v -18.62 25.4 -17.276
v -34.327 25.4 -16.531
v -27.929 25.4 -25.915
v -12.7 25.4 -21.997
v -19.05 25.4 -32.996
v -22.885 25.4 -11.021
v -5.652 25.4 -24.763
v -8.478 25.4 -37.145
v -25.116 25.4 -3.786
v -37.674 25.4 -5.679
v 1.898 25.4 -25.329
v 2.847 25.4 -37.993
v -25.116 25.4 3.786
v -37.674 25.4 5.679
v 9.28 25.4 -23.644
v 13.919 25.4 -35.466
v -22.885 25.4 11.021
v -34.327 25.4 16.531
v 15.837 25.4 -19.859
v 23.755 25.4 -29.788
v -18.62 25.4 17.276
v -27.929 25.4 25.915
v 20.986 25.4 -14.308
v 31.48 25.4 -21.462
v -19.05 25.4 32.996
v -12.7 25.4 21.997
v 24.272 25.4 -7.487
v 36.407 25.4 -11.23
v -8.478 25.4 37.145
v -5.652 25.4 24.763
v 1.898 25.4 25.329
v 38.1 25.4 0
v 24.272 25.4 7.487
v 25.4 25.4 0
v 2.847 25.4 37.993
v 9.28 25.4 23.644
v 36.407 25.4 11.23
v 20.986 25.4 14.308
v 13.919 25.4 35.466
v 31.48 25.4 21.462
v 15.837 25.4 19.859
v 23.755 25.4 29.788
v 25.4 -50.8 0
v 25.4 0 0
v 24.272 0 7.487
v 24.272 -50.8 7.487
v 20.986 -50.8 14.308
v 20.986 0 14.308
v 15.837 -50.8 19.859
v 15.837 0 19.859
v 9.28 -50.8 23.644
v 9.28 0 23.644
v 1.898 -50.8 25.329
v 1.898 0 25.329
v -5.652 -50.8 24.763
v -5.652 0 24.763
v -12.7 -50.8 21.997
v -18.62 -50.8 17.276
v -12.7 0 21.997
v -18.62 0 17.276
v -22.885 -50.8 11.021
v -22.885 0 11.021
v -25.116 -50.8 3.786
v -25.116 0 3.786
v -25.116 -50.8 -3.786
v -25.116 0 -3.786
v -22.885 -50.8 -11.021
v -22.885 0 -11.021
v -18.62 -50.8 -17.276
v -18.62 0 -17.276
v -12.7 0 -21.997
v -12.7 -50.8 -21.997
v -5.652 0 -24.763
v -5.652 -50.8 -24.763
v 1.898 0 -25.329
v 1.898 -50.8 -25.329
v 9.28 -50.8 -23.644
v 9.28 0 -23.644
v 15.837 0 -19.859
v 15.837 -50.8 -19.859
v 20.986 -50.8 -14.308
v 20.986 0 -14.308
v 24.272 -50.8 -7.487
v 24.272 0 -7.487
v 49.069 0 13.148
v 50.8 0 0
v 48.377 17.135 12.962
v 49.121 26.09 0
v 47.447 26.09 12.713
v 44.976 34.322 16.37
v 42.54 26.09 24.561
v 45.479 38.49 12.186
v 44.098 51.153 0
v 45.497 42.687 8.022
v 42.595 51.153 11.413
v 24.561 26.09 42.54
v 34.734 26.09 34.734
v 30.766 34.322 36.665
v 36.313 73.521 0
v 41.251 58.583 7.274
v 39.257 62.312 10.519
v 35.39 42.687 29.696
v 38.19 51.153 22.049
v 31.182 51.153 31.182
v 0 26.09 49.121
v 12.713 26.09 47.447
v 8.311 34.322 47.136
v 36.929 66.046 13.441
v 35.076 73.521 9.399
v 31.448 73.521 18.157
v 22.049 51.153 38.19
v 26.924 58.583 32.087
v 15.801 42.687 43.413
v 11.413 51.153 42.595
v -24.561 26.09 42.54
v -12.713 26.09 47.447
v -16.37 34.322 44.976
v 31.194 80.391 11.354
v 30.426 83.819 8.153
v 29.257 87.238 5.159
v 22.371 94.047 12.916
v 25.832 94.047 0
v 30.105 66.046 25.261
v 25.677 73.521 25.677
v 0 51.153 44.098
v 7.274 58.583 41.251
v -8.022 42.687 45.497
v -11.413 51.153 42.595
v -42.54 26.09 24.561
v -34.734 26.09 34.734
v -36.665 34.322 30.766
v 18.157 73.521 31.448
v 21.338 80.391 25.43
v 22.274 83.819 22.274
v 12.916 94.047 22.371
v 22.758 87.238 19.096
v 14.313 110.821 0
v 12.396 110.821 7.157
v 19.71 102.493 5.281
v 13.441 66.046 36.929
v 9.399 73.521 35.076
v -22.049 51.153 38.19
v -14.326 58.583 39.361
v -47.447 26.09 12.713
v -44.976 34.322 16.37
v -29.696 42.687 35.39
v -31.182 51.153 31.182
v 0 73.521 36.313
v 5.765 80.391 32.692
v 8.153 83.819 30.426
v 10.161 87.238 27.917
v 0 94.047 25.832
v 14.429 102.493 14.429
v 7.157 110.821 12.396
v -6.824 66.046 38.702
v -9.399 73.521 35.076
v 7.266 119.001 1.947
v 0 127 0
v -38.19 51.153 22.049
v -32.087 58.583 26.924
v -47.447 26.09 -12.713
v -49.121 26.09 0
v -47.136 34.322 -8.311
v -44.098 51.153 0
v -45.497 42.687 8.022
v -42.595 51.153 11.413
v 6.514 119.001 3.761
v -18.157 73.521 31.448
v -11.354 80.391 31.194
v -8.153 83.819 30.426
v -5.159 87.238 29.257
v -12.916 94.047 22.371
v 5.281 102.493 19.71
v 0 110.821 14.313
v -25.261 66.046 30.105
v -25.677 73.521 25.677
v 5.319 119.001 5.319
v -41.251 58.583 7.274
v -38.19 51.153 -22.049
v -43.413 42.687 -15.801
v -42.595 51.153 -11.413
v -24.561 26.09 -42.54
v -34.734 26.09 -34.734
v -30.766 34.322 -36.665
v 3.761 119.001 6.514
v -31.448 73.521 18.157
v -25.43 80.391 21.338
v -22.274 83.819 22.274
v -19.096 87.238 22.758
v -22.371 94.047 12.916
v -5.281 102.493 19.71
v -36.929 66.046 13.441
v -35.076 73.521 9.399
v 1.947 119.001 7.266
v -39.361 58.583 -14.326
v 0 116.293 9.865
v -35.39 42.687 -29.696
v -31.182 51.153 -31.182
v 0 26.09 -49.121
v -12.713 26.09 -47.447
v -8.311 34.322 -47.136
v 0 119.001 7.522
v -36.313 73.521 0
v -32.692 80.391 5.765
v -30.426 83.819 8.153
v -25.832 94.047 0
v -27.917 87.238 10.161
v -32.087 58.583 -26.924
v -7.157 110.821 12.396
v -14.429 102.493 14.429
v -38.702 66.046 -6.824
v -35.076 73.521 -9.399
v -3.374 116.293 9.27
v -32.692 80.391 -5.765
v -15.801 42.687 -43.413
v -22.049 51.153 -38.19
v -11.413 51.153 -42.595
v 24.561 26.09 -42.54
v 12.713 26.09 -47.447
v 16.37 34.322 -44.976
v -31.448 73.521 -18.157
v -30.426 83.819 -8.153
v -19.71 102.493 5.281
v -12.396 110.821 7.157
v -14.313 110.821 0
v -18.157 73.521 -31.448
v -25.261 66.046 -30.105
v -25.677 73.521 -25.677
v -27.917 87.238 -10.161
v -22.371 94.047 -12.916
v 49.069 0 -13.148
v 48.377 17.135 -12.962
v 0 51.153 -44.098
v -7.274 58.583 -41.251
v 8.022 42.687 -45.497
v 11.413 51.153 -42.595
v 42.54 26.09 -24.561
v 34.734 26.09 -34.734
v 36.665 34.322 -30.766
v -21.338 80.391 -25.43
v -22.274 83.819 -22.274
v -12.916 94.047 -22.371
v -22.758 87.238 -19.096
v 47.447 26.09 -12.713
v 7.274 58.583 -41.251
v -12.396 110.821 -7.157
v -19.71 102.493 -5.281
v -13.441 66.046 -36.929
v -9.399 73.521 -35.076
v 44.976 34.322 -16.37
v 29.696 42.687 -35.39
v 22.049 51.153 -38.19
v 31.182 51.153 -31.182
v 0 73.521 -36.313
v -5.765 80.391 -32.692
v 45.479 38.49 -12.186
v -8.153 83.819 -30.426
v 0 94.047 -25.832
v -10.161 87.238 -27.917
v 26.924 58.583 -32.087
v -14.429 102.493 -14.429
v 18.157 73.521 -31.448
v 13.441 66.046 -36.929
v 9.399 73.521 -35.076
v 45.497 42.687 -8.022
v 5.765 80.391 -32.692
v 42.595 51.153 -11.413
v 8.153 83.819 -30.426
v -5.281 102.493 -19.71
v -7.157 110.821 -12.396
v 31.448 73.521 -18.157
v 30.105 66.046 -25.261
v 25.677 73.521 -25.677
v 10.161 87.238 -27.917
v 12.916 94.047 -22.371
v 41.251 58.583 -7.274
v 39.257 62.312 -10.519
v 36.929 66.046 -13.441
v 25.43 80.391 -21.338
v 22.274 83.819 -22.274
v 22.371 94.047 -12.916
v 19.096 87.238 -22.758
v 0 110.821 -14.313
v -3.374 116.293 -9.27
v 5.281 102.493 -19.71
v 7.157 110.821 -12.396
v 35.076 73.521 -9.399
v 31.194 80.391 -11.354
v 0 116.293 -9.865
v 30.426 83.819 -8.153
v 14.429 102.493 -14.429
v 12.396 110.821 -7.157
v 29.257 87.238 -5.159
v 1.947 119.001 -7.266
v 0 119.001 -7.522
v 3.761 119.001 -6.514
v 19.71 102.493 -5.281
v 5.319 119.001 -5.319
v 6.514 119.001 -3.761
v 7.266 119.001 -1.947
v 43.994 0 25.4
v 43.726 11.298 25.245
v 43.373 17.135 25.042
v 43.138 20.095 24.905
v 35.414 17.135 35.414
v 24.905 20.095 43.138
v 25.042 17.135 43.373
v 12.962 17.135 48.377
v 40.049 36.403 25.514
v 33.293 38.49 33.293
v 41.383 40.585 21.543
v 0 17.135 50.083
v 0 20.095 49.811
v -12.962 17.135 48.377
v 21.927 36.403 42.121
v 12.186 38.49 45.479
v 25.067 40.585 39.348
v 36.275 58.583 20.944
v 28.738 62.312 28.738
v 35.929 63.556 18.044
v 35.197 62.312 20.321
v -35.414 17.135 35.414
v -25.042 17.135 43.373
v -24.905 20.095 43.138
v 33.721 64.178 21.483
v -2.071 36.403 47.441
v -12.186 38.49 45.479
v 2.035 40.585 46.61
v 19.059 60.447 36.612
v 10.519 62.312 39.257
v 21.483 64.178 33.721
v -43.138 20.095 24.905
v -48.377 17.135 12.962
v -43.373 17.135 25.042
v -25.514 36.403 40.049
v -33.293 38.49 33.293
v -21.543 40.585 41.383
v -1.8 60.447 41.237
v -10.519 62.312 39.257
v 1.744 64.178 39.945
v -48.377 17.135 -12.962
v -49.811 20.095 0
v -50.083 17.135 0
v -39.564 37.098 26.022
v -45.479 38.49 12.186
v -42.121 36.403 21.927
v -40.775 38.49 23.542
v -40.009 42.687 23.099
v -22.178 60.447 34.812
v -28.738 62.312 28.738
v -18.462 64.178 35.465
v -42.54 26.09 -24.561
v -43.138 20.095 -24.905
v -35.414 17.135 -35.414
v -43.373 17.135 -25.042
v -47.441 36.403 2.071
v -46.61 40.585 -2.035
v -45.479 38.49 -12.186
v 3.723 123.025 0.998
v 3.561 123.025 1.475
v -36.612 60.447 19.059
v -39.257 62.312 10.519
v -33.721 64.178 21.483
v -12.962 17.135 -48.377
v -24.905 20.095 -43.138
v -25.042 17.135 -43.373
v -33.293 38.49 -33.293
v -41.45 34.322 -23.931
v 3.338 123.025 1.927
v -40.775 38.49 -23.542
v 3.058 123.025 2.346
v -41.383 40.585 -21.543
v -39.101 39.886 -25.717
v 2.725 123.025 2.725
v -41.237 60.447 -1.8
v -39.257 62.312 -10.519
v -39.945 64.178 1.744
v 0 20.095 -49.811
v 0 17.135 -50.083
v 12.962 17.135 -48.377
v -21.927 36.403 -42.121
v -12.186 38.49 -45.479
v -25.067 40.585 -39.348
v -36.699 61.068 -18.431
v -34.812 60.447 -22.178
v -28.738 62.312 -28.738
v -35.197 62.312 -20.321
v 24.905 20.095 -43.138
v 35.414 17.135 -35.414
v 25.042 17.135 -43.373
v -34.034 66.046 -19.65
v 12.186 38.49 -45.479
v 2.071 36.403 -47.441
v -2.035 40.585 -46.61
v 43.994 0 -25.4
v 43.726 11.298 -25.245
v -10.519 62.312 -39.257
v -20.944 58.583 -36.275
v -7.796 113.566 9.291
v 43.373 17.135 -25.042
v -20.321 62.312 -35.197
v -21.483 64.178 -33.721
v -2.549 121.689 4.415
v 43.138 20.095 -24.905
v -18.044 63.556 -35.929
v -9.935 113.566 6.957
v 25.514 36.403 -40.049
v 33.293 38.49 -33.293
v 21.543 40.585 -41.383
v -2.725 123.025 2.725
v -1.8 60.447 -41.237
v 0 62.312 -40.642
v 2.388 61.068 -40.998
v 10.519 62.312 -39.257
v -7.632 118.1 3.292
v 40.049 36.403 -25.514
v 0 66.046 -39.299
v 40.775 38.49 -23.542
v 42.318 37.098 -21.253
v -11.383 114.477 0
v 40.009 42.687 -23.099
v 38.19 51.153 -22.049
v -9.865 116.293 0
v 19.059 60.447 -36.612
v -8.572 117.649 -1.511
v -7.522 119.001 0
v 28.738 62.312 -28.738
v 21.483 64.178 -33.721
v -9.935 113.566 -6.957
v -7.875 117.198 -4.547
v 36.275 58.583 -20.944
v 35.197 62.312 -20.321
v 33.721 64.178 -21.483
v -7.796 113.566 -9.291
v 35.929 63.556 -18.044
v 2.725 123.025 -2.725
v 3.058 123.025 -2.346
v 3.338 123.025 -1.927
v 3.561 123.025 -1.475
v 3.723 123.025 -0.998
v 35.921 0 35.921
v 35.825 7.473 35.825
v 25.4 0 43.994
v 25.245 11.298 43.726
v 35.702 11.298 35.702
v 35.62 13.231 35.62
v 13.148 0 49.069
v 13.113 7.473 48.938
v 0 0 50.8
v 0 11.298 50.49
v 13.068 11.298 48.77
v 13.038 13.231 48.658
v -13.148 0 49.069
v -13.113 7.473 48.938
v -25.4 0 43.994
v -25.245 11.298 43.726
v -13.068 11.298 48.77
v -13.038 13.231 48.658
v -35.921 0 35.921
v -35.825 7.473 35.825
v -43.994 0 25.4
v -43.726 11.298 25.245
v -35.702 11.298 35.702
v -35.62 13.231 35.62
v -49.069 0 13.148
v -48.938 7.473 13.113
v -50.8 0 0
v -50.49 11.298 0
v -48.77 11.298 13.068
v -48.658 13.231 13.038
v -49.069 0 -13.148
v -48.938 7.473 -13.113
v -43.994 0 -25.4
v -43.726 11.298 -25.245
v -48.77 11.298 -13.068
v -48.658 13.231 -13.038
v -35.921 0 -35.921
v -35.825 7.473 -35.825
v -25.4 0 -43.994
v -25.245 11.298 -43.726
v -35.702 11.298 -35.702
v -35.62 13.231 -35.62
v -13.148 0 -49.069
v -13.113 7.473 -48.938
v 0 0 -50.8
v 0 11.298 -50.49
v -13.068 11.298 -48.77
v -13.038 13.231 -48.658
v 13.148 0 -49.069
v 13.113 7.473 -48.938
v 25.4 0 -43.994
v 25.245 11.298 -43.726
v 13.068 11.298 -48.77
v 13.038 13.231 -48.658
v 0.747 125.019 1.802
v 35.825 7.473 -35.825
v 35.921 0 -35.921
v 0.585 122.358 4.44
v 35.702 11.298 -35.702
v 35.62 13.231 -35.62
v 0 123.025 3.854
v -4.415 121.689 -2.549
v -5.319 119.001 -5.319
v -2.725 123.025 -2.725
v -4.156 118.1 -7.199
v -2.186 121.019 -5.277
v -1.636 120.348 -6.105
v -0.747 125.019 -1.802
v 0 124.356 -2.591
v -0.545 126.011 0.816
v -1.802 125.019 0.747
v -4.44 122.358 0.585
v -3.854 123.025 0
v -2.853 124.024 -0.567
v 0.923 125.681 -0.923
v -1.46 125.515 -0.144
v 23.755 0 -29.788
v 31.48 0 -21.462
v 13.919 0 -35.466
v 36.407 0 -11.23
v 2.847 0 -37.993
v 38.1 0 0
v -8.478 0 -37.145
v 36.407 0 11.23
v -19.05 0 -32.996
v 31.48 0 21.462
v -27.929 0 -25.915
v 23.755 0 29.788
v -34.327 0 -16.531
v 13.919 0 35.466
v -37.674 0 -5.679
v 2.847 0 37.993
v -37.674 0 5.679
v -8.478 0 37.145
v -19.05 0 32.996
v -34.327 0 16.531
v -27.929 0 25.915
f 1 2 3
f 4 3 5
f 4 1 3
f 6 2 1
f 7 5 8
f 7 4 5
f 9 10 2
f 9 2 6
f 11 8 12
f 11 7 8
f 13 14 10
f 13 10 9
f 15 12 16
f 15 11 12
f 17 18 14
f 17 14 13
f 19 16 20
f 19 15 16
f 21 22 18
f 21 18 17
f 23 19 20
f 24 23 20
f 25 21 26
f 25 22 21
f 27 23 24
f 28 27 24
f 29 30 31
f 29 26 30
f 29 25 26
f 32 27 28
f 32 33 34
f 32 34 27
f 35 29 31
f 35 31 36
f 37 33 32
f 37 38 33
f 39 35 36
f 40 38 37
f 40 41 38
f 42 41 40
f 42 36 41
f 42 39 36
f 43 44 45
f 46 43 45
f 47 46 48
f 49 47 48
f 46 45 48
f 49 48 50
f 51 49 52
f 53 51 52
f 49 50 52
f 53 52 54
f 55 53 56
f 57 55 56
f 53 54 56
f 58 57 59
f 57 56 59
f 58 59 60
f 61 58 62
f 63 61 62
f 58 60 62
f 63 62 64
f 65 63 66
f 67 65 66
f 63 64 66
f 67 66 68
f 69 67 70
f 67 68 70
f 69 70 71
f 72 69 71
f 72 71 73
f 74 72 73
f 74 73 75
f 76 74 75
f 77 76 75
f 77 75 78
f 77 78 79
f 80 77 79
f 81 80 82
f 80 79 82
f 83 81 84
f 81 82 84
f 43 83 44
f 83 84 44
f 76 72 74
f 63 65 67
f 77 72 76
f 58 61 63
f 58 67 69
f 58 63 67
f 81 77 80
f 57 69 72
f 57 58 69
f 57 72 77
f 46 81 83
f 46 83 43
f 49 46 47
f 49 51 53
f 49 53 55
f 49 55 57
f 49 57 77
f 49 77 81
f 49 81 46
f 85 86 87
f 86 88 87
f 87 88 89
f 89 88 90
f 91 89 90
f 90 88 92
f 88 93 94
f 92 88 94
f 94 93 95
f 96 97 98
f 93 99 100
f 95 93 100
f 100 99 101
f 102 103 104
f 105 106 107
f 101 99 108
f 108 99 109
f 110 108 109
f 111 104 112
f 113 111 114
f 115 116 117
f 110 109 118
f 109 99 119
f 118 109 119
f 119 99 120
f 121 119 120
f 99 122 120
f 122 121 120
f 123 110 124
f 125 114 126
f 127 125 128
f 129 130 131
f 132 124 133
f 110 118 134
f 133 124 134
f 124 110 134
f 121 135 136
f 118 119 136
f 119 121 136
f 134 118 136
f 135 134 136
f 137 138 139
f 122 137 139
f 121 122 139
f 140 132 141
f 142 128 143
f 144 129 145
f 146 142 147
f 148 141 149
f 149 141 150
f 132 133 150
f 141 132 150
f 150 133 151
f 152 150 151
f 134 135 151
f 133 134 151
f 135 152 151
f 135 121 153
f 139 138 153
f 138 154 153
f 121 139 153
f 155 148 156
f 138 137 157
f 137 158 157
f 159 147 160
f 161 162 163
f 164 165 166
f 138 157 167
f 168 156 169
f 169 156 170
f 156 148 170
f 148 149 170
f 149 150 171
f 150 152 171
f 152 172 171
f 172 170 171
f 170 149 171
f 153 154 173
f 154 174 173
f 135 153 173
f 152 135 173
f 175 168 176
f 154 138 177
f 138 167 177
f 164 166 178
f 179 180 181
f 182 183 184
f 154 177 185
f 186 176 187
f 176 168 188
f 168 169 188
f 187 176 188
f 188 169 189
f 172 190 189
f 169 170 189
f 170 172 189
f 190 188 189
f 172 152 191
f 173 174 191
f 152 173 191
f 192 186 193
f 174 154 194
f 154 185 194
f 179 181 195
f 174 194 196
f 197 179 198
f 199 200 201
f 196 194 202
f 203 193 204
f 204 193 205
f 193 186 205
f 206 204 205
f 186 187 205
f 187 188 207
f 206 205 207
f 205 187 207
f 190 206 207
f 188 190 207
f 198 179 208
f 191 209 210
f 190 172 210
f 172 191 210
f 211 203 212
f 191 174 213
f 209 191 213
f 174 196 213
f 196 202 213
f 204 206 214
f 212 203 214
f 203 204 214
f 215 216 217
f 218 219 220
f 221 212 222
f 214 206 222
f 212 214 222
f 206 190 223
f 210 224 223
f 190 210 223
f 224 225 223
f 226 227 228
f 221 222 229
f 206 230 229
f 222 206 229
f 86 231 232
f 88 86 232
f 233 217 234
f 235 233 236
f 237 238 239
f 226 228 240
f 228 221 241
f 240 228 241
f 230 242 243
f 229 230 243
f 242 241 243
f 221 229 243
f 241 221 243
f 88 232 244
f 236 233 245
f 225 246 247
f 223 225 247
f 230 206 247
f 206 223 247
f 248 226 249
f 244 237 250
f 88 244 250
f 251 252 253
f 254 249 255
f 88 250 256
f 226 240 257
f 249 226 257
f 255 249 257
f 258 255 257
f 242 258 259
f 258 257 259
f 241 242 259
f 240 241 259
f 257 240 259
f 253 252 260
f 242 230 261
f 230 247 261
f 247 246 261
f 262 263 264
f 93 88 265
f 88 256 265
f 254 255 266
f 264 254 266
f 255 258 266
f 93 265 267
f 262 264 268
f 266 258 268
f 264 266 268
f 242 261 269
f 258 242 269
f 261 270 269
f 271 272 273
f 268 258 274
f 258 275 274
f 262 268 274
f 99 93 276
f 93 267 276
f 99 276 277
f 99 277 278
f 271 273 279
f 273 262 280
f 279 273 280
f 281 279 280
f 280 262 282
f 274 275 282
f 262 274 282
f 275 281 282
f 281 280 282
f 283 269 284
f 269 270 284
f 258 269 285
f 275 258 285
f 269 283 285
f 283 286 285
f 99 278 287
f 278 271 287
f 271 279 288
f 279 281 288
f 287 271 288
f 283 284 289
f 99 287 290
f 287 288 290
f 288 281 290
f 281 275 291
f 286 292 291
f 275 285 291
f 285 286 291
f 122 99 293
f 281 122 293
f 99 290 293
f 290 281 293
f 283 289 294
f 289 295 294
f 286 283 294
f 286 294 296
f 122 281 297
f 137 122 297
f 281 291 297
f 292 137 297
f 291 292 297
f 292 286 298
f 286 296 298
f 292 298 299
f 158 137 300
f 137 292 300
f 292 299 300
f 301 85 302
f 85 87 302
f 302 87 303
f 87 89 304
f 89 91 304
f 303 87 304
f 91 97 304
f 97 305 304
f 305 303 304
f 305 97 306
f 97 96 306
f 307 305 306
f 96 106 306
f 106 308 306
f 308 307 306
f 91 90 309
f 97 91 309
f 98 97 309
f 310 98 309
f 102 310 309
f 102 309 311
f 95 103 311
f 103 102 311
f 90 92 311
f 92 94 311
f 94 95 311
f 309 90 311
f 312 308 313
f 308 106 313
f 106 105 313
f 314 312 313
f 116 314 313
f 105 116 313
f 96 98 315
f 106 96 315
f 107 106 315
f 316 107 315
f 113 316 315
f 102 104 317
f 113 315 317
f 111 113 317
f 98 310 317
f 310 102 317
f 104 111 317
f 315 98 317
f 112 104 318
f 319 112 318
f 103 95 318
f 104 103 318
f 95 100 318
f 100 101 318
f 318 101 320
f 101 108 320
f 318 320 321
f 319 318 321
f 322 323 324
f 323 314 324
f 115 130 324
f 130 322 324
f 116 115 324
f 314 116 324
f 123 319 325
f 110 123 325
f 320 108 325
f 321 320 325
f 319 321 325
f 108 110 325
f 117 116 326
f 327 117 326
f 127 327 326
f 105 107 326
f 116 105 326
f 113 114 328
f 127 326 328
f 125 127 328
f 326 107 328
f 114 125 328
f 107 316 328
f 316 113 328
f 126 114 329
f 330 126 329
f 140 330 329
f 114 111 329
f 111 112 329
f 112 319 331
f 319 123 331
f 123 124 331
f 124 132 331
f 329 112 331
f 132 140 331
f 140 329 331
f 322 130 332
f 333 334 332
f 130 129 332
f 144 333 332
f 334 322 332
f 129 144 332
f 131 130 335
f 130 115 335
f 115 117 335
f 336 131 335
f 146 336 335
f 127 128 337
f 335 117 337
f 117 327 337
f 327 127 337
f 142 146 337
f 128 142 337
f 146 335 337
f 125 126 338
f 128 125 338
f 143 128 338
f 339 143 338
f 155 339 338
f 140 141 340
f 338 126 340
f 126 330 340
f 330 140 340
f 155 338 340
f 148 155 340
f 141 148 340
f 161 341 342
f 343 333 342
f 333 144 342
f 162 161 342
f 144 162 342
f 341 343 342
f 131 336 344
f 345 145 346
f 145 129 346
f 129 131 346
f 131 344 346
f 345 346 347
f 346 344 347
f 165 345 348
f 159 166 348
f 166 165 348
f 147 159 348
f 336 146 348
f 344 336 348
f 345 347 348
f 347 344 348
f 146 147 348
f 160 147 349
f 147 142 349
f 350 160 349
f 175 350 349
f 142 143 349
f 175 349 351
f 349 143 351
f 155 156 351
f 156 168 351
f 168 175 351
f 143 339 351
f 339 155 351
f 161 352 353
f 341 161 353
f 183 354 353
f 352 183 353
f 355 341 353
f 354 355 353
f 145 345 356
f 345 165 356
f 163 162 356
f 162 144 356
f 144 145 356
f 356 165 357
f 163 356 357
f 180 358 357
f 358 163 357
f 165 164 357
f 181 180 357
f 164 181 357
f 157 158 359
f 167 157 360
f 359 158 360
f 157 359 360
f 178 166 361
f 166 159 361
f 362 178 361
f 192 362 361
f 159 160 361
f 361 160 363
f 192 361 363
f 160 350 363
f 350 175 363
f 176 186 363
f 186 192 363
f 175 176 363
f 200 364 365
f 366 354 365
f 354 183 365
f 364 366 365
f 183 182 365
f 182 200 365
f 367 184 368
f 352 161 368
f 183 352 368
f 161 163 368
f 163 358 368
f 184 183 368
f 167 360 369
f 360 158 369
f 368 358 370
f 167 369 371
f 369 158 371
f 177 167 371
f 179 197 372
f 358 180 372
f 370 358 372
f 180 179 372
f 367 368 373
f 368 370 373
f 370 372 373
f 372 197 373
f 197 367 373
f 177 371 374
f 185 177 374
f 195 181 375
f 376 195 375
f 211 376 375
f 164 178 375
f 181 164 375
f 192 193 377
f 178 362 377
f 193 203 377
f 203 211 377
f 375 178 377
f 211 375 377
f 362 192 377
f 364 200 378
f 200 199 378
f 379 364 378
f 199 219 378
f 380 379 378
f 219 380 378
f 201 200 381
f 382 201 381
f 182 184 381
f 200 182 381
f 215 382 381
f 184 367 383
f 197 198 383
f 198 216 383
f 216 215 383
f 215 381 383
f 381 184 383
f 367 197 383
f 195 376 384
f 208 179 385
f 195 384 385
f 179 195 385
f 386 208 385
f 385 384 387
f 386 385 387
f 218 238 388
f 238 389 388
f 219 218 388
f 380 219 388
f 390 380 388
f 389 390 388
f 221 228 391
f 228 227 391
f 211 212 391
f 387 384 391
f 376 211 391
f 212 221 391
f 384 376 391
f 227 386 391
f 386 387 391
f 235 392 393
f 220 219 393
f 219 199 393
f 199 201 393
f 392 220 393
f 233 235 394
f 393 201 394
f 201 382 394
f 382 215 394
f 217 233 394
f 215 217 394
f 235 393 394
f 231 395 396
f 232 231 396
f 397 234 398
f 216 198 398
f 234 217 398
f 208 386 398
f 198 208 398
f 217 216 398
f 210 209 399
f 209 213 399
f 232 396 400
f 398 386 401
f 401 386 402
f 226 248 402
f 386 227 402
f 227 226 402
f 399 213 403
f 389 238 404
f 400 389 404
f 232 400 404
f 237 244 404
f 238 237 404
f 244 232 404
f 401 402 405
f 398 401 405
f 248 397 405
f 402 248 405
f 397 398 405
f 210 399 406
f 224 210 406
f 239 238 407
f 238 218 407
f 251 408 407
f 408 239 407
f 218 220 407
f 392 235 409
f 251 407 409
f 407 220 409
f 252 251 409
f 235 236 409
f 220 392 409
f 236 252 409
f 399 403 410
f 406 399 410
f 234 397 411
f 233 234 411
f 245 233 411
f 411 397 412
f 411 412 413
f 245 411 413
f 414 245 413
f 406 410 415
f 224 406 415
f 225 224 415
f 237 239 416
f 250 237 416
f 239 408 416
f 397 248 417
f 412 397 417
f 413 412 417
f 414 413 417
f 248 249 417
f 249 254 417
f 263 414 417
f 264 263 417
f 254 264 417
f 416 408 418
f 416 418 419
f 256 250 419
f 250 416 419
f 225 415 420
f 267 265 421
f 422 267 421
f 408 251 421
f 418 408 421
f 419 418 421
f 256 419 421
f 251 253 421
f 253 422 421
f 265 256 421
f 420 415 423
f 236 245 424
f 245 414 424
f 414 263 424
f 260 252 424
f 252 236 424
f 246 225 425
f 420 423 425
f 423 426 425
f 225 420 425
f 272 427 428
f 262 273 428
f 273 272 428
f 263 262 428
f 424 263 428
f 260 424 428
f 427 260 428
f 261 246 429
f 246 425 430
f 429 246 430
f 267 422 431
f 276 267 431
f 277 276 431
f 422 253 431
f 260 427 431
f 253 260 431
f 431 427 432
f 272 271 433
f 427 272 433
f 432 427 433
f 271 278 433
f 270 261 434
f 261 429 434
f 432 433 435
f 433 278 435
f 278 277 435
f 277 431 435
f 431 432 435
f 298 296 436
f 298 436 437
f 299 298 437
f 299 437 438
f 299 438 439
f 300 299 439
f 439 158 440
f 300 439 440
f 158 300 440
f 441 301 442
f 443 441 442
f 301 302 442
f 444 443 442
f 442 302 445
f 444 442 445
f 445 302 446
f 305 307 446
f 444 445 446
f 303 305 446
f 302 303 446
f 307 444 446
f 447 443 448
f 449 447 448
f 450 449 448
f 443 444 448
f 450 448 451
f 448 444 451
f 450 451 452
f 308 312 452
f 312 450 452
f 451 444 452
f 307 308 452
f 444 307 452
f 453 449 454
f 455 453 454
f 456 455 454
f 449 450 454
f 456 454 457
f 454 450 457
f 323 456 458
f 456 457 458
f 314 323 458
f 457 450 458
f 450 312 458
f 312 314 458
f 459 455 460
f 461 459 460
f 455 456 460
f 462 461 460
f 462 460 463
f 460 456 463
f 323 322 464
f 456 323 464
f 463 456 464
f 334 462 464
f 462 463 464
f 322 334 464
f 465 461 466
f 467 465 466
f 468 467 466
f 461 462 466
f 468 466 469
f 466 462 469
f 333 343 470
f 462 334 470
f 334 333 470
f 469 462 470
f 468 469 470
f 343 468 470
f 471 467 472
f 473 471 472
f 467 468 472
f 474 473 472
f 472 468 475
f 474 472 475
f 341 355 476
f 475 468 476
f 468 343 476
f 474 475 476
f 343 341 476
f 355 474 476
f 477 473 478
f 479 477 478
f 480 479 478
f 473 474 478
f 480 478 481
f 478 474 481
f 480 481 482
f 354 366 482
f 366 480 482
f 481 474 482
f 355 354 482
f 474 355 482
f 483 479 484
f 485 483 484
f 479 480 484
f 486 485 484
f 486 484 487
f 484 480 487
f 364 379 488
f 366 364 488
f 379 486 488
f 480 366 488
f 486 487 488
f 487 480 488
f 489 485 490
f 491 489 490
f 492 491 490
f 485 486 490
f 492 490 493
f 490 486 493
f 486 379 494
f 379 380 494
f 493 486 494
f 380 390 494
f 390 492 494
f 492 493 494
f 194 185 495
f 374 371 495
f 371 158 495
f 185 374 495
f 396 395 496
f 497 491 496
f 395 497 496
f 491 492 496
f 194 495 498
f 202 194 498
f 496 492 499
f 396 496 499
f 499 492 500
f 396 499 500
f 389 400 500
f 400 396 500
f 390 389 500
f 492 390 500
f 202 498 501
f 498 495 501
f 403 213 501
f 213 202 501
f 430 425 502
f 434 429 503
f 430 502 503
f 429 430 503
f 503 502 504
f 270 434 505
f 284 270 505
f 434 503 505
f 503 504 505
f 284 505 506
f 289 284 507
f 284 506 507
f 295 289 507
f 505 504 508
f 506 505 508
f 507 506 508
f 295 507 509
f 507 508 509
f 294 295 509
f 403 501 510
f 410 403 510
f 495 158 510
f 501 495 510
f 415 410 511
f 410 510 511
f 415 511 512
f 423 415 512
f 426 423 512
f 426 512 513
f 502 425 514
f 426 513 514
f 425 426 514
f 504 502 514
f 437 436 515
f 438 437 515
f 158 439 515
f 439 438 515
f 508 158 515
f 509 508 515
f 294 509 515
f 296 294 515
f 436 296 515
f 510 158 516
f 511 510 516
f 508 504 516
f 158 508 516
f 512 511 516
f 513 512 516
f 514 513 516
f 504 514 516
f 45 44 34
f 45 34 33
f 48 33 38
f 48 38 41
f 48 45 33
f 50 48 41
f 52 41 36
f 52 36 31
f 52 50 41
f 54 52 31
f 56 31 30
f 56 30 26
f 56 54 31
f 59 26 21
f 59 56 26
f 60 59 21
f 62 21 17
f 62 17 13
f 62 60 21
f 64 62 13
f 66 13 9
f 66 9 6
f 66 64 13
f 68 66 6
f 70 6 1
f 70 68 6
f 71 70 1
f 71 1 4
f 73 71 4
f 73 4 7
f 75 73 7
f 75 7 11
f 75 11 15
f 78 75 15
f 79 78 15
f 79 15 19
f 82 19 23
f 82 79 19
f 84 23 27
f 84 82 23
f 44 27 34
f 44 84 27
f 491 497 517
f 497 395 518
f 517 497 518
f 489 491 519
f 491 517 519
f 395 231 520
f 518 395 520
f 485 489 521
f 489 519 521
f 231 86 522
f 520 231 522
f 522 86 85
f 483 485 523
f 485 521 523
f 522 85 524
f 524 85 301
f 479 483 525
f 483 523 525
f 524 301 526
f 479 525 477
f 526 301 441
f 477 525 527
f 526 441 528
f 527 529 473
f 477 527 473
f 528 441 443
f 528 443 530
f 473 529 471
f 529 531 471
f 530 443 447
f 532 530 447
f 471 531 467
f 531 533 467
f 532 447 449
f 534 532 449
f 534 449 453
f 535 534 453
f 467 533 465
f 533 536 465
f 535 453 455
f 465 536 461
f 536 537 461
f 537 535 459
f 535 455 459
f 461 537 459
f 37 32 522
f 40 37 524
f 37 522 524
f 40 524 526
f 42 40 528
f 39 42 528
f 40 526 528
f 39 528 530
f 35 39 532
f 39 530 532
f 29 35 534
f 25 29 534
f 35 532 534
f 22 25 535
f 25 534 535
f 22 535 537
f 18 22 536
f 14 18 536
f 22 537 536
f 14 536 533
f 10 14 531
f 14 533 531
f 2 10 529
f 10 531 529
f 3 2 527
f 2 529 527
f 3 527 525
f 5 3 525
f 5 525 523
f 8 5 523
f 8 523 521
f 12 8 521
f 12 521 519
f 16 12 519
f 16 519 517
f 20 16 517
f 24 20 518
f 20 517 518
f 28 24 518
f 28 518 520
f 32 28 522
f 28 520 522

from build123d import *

# Parameters (mm, degrees)
F2_R     = 38.1
F2_R_2   = 25.4
F3_DEPTH = 25.4
F4_DEPTH = 50.8


with BuildPart() as f1:
    # F0 (on Top) → F1 (revolve)
    with BuildSketch(Plane.XY):
        with BuildLine():
            add(Edge.make_bspline(
                [(50.8, 0), (50.8, 38.1), (40.31148, 86.68852), (0, 127)],
                knots=[0, 0, 0, 0, 136.783186, 136.783186, 136.783186, 136.783186], degree=3))
            Line((0, 127), (0, 0))
            Line((0, 0), (50.8, 0))
        make_face()
    revolve(axis=Axis((0, 63.5, 0), (0, -1, 0)))

    # F2 (on face) → F3 (cut)
    with BuildSketch(Plane.XZ):
        Circle(F2_R)
        Circle(F2_R_2, mode=Mode.SUBTRACT)
    extrude(amount=-F3_DEPTH, mode=Mode.SUBTRACT)

    # F2 (on face) → F4 (join)
    with BuildSketch(Plane.XZ):
        Circle(F2_R_2)
    extrude(amount=F4_DEPTH)


solid = f1.part
